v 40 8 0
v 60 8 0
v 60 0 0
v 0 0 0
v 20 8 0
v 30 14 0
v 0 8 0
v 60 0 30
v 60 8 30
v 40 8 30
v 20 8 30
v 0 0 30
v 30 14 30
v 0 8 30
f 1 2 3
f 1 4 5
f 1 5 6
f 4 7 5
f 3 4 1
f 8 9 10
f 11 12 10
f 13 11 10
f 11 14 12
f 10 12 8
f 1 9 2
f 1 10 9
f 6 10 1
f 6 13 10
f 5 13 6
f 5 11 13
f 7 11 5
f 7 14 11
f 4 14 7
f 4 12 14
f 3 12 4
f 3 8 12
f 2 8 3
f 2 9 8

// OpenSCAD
$fn = 32;

// ----------------------------------------------------------------------
// V guide rail: vrib, 60 mm wide
// ----------------------------------------------------------------------

// --- parameters (mm) ---
rail_w = 60;              // rail width, X
base_t = 8;               // base plate thickness
v_depth = 6;              // V feature depth / height
v_half_w = 10;            // half width of the V at the base face
plate_t = 30;             // rail length, Z (the extrusion height)

profile = [[0, 0], [60, 0], [60, 8], [40, 8], [30, 14], [20, 8], [0, 8]];  // primary outline, 7 points, counter clockwise

// --- the one profile operation ---
linear_extrude(height = plate_t) polygon(points = profile);
